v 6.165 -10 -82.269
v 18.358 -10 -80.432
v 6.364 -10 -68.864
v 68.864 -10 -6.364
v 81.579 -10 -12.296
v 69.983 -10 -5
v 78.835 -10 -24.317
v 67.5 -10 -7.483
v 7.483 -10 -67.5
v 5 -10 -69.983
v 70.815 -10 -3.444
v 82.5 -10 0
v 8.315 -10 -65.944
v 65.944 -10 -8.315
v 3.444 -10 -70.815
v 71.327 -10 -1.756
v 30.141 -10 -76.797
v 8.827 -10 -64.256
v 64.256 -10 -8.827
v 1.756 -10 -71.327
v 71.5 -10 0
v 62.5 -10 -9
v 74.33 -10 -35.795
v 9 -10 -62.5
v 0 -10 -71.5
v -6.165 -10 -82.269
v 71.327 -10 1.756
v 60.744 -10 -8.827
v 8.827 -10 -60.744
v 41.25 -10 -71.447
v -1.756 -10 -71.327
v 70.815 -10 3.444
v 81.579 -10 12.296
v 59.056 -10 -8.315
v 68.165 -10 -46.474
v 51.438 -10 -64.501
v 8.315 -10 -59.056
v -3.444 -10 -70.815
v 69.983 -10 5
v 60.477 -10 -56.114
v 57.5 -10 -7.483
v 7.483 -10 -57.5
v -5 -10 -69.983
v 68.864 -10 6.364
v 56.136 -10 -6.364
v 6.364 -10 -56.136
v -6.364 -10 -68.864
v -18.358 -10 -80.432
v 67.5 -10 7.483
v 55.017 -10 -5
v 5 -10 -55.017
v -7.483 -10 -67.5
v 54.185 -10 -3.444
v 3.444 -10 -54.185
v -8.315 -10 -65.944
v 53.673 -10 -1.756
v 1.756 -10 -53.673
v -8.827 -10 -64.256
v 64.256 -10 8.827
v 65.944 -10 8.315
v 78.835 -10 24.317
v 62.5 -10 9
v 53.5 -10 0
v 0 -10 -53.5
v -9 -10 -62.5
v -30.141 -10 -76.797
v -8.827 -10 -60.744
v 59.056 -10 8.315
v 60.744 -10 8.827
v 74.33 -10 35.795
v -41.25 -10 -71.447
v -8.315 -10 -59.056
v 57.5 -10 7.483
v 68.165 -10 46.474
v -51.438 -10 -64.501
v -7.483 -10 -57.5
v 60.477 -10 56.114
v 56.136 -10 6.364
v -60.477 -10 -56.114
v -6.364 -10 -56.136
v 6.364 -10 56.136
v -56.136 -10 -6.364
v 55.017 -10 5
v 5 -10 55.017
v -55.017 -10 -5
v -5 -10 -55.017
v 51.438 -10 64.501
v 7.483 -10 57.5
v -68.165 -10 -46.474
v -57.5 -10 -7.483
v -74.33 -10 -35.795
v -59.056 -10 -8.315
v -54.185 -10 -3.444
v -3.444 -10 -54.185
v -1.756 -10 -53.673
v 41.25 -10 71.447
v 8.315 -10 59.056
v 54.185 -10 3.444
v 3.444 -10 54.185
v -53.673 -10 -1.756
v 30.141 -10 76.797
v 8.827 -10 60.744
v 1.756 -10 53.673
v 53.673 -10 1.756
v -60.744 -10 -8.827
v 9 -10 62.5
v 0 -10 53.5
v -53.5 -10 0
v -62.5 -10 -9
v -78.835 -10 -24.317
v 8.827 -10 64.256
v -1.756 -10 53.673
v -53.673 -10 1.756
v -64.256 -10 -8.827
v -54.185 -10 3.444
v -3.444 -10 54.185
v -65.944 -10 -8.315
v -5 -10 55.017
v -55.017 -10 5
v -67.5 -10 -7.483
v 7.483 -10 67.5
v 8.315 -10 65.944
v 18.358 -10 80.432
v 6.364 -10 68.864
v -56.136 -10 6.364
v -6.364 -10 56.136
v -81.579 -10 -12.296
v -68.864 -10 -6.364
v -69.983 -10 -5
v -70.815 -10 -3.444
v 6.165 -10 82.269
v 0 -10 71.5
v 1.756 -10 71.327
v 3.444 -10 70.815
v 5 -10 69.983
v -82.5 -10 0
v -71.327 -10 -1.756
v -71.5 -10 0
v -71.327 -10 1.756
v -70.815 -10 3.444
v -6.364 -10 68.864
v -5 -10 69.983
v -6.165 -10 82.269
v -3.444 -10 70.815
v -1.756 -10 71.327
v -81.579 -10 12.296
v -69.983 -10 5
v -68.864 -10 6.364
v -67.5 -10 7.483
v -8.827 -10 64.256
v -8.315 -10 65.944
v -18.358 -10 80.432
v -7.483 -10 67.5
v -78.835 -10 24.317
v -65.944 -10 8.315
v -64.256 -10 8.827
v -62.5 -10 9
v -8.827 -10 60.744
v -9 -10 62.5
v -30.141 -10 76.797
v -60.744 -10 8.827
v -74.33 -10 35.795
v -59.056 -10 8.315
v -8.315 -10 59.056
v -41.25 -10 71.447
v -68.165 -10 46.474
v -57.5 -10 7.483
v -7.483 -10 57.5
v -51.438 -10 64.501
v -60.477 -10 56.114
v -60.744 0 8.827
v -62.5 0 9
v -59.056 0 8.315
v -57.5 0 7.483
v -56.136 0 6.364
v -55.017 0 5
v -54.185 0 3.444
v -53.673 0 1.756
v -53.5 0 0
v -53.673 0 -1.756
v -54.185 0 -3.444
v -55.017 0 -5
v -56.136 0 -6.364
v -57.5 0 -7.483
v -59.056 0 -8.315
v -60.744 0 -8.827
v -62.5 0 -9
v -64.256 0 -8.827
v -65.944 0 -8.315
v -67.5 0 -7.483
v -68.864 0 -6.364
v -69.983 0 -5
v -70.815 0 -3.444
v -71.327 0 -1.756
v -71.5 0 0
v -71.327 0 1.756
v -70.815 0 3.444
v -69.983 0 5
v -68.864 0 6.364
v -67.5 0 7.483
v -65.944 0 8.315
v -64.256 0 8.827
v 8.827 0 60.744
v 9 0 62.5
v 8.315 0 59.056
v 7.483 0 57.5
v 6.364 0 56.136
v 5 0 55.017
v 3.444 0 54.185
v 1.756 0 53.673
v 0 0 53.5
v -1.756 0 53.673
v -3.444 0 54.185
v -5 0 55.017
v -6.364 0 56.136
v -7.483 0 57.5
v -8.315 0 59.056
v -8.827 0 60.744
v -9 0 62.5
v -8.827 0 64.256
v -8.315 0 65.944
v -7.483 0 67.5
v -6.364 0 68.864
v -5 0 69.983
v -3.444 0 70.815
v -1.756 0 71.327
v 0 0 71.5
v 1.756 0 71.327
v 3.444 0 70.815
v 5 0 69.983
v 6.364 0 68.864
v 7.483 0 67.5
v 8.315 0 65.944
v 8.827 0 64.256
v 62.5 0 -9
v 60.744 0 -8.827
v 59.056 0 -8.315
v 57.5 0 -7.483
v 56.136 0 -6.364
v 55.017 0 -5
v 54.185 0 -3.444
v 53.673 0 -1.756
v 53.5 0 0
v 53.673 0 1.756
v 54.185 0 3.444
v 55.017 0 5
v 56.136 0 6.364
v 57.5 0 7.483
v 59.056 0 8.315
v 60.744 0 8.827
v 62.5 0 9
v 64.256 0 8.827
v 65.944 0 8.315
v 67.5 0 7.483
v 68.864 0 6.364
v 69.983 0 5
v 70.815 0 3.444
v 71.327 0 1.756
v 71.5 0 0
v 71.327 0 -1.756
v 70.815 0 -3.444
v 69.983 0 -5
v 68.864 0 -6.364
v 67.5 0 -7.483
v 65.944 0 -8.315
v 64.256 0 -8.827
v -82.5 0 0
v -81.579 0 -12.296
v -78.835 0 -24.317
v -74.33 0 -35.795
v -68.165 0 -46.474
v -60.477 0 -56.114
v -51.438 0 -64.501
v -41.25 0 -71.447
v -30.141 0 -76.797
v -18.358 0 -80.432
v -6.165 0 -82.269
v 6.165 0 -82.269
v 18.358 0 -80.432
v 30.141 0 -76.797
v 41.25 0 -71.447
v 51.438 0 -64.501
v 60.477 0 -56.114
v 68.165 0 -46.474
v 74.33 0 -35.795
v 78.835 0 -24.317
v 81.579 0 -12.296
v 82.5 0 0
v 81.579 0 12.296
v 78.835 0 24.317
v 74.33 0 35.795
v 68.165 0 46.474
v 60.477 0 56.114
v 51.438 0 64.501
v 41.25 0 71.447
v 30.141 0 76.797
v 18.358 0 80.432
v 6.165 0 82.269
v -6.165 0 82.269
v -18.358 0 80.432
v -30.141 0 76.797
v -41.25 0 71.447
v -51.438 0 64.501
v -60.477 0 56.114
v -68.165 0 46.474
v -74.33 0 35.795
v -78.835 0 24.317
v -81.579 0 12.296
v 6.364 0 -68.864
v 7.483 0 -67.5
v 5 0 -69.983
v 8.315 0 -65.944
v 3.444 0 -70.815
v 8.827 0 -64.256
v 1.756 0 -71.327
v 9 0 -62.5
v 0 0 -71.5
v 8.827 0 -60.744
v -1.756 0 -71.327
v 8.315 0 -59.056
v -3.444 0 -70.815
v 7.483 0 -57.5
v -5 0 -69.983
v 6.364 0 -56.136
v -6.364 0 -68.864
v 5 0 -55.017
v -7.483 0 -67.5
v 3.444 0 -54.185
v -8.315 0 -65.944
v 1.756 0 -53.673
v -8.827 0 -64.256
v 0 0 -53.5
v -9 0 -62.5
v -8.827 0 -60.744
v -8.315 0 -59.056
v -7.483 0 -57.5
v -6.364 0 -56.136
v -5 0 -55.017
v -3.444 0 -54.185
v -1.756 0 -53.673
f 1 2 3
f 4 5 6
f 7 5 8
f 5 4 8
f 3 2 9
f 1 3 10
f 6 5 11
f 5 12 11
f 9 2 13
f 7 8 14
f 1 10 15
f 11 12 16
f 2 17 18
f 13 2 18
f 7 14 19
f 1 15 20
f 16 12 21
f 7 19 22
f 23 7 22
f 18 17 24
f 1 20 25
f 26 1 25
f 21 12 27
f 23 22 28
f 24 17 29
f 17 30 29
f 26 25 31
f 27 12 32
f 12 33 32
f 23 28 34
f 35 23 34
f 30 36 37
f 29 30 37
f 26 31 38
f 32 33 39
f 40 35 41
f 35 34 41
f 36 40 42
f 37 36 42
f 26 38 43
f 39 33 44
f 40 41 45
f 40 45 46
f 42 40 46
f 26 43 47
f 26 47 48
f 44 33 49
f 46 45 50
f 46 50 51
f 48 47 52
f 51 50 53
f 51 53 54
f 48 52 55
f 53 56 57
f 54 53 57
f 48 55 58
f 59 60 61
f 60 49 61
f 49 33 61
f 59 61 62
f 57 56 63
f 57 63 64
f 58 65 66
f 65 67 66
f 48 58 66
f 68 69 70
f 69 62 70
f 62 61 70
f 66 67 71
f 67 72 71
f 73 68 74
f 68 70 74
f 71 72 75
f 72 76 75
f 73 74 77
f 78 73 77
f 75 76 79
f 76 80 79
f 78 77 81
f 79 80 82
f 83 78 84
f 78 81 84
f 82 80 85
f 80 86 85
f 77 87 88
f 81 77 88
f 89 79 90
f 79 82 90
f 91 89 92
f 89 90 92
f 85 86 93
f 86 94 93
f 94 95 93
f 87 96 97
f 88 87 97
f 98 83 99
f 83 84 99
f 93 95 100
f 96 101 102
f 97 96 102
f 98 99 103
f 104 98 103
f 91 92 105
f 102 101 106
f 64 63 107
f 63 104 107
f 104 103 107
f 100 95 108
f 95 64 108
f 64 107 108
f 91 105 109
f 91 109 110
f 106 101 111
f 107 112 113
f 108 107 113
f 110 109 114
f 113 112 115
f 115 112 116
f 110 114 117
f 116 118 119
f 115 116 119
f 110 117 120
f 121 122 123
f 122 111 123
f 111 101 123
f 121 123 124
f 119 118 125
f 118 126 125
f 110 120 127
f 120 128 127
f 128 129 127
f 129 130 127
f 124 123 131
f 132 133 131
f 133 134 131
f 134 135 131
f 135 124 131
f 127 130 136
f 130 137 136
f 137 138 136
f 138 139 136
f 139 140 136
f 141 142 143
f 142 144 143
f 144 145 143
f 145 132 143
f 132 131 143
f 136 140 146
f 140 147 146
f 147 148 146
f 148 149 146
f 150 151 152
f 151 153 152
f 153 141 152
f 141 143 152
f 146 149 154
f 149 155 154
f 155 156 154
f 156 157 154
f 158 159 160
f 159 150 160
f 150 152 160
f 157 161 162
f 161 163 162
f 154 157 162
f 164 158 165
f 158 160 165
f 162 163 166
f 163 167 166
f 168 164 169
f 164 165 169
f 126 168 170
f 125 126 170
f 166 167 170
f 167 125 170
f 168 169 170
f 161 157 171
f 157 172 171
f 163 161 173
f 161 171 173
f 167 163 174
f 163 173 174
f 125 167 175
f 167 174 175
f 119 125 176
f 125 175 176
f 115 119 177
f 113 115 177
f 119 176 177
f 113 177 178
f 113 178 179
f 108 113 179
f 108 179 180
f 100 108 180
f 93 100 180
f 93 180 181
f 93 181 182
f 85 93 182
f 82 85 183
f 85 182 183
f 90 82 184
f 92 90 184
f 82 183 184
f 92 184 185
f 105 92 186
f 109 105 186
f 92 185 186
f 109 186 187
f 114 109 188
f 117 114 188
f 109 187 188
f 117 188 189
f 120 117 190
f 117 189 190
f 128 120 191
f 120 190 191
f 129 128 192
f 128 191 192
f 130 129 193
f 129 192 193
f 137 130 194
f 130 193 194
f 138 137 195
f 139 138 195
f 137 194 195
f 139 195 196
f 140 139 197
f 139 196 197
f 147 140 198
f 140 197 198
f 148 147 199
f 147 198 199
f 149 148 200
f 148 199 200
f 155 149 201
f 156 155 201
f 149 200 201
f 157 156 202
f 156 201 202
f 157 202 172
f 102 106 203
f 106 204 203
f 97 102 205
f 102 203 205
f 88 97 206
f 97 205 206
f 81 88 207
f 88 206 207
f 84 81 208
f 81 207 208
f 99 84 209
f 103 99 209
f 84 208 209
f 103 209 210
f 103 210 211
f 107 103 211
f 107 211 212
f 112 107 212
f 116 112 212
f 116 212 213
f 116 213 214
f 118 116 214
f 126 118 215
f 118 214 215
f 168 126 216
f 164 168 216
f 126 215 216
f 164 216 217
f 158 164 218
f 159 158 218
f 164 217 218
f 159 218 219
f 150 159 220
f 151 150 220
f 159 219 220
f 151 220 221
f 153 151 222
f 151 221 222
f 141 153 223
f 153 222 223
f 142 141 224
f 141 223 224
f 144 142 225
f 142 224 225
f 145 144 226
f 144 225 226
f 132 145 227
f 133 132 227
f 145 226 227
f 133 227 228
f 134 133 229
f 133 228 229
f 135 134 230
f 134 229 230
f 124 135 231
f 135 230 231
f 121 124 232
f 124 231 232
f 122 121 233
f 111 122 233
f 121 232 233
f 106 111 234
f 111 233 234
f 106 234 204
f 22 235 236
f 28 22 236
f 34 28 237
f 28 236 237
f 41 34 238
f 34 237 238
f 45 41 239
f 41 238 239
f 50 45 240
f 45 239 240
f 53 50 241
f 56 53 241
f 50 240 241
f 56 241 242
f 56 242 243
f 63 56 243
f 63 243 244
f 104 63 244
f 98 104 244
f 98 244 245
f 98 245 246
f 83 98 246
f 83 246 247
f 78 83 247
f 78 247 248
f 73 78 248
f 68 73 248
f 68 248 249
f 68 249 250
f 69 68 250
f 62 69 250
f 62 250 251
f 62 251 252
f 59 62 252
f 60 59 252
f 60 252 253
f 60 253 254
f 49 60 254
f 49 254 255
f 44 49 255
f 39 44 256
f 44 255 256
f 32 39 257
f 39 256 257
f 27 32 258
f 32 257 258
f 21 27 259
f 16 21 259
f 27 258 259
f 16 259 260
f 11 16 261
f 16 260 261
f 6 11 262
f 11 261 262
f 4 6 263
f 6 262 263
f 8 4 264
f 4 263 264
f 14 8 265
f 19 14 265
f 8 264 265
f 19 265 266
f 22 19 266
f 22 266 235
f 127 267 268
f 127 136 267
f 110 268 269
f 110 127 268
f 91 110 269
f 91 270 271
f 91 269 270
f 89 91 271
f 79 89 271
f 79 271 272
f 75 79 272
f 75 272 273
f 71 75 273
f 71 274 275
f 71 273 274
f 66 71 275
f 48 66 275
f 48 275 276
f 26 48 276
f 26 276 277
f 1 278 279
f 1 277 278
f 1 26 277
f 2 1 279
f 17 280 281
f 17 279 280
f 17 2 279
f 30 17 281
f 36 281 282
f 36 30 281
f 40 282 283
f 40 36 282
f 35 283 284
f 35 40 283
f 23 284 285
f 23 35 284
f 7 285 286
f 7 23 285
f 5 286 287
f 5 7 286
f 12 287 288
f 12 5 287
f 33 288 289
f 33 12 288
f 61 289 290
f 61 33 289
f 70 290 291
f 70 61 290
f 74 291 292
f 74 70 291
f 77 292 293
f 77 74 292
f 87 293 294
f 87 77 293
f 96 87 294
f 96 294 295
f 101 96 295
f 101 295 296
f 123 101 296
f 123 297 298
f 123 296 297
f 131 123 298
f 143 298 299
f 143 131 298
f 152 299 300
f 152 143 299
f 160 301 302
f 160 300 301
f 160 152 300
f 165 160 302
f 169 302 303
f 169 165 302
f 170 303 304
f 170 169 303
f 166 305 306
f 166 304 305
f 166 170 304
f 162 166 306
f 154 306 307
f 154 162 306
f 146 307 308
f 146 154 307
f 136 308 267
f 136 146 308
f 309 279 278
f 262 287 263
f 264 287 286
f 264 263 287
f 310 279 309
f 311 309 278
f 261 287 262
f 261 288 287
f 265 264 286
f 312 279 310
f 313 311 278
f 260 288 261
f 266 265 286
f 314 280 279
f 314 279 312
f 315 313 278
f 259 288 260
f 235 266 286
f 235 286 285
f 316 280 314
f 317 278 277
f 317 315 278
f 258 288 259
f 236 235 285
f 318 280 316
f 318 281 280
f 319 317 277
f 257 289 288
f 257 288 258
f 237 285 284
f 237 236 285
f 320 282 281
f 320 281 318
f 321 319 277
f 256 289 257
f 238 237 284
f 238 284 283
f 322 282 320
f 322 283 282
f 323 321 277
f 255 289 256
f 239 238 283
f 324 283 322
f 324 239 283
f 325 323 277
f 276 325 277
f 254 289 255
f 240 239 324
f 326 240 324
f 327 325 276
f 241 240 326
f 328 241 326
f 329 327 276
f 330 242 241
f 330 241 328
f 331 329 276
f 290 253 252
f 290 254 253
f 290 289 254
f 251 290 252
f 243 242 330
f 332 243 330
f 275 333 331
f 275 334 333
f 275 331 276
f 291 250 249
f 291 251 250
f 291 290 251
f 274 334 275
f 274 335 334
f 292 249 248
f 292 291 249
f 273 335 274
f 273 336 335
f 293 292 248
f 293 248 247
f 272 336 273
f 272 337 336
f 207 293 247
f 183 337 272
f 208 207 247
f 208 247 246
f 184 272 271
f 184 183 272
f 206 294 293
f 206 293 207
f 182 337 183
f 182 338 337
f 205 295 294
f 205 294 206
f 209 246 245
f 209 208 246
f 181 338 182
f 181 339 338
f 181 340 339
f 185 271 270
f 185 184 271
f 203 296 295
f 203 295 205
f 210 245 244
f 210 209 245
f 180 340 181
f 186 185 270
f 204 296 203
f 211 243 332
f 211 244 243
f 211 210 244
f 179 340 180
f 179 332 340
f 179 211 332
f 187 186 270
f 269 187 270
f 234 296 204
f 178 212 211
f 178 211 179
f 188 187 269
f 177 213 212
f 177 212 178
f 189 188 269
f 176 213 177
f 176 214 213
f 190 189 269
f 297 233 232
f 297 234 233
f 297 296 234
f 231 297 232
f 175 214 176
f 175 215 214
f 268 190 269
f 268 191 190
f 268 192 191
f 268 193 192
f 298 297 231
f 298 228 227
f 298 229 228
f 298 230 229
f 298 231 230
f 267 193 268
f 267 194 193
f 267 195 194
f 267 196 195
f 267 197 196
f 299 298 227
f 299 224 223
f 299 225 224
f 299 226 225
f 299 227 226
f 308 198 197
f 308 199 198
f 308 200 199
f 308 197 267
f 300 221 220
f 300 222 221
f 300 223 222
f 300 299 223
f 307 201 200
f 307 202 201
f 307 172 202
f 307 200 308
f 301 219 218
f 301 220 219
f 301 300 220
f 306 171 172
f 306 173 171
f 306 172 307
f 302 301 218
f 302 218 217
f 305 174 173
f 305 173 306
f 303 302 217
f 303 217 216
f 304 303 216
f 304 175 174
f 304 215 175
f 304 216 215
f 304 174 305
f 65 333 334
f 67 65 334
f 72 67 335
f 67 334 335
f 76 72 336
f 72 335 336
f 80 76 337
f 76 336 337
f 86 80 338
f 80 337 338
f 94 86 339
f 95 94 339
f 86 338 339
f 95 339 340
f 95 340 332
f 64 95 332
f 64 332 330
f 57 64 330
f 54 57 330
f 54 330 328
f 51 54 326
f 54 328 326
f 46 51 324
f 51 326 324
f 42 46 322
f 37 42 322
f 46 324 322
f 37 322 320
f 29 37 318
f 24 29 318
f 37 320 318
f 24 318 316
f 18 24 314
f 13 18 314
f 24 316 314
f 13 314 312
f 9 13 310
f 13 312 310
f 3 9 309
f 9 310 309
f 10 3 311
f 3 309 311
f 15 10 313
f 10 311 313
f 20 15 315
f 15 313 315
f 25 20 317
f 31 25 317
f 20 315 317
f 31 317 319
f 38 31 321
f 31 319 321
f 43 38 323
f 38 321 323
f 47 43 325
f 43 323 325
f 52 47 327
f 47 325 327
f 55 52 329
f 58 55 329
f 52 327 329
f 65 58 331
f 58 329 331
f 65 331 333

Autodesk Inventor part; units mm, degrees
ref_plane "YZ Plane" through (0, 0, 0) normal (1, 0, 0) x (0, 1, 0)
ref_plane "XZ Plane" through (0, 0, 0) normal (0, 1, 0) x (-1, 0, 0)
ref_plane "XY Plane" through (0, 0, 0) normal (0, 0, 1) x (1, 0, 0)
sketch "Sketch1" plane through (0, 0, 0) normal (0, 0, 1) x (1, 0, 0)
  line L0 (-82.5, 3) -> (-82.5, 18) construction
  line L1 (82.5, 3) -> (-82.5, 3) construction
  line L2 (-51, 0) -> (-51, 3) construction
  line L3 (-82.5, 0) -> (-82.5, -10)
  line L4 (-82.5, -10) -> (0, -10)
  line L5 (0, -10) -> (0, 0)
  line L6 (0, 0) -> (-82.5, 0)
  dimension "d0" = 10
revolve "Revolution1" add sketch "Sketch1" angle 360 about axis through (0, -10, 0) along (0, 1, 0)
sketch "Sketch2" plane through (0, -10, 0) normal (0, -1, 0) x (1, 0, 0)
  circle A0 centre (0, 0) radius 49.3853 construction
  circle A1 centre (-62.5, 0) radius 9.2 projected
  circle A2 centre (0, 62.5) radius 9.2 projected
  circle A3 centre (0, 0) radius 82.3 projected
  circle A4 centre (62.5, 0) radius 9.2 projected
  circle A5 centre (0, -62.5) radius 9.2 projected
  point P0 (0, 0)
  point P1 (62.5, 0)
hole "Hole1" at (62.5, -10, 0) direction (0, 1, 0) diameter 18 end through all
pattern_circular "Circular Pattern1" count 4 over 360 about axis through (0, -10, 0) along (0, 1, 0) of "Hole1"
properties part number "vakkarima2" material "Steel, Alloy"
